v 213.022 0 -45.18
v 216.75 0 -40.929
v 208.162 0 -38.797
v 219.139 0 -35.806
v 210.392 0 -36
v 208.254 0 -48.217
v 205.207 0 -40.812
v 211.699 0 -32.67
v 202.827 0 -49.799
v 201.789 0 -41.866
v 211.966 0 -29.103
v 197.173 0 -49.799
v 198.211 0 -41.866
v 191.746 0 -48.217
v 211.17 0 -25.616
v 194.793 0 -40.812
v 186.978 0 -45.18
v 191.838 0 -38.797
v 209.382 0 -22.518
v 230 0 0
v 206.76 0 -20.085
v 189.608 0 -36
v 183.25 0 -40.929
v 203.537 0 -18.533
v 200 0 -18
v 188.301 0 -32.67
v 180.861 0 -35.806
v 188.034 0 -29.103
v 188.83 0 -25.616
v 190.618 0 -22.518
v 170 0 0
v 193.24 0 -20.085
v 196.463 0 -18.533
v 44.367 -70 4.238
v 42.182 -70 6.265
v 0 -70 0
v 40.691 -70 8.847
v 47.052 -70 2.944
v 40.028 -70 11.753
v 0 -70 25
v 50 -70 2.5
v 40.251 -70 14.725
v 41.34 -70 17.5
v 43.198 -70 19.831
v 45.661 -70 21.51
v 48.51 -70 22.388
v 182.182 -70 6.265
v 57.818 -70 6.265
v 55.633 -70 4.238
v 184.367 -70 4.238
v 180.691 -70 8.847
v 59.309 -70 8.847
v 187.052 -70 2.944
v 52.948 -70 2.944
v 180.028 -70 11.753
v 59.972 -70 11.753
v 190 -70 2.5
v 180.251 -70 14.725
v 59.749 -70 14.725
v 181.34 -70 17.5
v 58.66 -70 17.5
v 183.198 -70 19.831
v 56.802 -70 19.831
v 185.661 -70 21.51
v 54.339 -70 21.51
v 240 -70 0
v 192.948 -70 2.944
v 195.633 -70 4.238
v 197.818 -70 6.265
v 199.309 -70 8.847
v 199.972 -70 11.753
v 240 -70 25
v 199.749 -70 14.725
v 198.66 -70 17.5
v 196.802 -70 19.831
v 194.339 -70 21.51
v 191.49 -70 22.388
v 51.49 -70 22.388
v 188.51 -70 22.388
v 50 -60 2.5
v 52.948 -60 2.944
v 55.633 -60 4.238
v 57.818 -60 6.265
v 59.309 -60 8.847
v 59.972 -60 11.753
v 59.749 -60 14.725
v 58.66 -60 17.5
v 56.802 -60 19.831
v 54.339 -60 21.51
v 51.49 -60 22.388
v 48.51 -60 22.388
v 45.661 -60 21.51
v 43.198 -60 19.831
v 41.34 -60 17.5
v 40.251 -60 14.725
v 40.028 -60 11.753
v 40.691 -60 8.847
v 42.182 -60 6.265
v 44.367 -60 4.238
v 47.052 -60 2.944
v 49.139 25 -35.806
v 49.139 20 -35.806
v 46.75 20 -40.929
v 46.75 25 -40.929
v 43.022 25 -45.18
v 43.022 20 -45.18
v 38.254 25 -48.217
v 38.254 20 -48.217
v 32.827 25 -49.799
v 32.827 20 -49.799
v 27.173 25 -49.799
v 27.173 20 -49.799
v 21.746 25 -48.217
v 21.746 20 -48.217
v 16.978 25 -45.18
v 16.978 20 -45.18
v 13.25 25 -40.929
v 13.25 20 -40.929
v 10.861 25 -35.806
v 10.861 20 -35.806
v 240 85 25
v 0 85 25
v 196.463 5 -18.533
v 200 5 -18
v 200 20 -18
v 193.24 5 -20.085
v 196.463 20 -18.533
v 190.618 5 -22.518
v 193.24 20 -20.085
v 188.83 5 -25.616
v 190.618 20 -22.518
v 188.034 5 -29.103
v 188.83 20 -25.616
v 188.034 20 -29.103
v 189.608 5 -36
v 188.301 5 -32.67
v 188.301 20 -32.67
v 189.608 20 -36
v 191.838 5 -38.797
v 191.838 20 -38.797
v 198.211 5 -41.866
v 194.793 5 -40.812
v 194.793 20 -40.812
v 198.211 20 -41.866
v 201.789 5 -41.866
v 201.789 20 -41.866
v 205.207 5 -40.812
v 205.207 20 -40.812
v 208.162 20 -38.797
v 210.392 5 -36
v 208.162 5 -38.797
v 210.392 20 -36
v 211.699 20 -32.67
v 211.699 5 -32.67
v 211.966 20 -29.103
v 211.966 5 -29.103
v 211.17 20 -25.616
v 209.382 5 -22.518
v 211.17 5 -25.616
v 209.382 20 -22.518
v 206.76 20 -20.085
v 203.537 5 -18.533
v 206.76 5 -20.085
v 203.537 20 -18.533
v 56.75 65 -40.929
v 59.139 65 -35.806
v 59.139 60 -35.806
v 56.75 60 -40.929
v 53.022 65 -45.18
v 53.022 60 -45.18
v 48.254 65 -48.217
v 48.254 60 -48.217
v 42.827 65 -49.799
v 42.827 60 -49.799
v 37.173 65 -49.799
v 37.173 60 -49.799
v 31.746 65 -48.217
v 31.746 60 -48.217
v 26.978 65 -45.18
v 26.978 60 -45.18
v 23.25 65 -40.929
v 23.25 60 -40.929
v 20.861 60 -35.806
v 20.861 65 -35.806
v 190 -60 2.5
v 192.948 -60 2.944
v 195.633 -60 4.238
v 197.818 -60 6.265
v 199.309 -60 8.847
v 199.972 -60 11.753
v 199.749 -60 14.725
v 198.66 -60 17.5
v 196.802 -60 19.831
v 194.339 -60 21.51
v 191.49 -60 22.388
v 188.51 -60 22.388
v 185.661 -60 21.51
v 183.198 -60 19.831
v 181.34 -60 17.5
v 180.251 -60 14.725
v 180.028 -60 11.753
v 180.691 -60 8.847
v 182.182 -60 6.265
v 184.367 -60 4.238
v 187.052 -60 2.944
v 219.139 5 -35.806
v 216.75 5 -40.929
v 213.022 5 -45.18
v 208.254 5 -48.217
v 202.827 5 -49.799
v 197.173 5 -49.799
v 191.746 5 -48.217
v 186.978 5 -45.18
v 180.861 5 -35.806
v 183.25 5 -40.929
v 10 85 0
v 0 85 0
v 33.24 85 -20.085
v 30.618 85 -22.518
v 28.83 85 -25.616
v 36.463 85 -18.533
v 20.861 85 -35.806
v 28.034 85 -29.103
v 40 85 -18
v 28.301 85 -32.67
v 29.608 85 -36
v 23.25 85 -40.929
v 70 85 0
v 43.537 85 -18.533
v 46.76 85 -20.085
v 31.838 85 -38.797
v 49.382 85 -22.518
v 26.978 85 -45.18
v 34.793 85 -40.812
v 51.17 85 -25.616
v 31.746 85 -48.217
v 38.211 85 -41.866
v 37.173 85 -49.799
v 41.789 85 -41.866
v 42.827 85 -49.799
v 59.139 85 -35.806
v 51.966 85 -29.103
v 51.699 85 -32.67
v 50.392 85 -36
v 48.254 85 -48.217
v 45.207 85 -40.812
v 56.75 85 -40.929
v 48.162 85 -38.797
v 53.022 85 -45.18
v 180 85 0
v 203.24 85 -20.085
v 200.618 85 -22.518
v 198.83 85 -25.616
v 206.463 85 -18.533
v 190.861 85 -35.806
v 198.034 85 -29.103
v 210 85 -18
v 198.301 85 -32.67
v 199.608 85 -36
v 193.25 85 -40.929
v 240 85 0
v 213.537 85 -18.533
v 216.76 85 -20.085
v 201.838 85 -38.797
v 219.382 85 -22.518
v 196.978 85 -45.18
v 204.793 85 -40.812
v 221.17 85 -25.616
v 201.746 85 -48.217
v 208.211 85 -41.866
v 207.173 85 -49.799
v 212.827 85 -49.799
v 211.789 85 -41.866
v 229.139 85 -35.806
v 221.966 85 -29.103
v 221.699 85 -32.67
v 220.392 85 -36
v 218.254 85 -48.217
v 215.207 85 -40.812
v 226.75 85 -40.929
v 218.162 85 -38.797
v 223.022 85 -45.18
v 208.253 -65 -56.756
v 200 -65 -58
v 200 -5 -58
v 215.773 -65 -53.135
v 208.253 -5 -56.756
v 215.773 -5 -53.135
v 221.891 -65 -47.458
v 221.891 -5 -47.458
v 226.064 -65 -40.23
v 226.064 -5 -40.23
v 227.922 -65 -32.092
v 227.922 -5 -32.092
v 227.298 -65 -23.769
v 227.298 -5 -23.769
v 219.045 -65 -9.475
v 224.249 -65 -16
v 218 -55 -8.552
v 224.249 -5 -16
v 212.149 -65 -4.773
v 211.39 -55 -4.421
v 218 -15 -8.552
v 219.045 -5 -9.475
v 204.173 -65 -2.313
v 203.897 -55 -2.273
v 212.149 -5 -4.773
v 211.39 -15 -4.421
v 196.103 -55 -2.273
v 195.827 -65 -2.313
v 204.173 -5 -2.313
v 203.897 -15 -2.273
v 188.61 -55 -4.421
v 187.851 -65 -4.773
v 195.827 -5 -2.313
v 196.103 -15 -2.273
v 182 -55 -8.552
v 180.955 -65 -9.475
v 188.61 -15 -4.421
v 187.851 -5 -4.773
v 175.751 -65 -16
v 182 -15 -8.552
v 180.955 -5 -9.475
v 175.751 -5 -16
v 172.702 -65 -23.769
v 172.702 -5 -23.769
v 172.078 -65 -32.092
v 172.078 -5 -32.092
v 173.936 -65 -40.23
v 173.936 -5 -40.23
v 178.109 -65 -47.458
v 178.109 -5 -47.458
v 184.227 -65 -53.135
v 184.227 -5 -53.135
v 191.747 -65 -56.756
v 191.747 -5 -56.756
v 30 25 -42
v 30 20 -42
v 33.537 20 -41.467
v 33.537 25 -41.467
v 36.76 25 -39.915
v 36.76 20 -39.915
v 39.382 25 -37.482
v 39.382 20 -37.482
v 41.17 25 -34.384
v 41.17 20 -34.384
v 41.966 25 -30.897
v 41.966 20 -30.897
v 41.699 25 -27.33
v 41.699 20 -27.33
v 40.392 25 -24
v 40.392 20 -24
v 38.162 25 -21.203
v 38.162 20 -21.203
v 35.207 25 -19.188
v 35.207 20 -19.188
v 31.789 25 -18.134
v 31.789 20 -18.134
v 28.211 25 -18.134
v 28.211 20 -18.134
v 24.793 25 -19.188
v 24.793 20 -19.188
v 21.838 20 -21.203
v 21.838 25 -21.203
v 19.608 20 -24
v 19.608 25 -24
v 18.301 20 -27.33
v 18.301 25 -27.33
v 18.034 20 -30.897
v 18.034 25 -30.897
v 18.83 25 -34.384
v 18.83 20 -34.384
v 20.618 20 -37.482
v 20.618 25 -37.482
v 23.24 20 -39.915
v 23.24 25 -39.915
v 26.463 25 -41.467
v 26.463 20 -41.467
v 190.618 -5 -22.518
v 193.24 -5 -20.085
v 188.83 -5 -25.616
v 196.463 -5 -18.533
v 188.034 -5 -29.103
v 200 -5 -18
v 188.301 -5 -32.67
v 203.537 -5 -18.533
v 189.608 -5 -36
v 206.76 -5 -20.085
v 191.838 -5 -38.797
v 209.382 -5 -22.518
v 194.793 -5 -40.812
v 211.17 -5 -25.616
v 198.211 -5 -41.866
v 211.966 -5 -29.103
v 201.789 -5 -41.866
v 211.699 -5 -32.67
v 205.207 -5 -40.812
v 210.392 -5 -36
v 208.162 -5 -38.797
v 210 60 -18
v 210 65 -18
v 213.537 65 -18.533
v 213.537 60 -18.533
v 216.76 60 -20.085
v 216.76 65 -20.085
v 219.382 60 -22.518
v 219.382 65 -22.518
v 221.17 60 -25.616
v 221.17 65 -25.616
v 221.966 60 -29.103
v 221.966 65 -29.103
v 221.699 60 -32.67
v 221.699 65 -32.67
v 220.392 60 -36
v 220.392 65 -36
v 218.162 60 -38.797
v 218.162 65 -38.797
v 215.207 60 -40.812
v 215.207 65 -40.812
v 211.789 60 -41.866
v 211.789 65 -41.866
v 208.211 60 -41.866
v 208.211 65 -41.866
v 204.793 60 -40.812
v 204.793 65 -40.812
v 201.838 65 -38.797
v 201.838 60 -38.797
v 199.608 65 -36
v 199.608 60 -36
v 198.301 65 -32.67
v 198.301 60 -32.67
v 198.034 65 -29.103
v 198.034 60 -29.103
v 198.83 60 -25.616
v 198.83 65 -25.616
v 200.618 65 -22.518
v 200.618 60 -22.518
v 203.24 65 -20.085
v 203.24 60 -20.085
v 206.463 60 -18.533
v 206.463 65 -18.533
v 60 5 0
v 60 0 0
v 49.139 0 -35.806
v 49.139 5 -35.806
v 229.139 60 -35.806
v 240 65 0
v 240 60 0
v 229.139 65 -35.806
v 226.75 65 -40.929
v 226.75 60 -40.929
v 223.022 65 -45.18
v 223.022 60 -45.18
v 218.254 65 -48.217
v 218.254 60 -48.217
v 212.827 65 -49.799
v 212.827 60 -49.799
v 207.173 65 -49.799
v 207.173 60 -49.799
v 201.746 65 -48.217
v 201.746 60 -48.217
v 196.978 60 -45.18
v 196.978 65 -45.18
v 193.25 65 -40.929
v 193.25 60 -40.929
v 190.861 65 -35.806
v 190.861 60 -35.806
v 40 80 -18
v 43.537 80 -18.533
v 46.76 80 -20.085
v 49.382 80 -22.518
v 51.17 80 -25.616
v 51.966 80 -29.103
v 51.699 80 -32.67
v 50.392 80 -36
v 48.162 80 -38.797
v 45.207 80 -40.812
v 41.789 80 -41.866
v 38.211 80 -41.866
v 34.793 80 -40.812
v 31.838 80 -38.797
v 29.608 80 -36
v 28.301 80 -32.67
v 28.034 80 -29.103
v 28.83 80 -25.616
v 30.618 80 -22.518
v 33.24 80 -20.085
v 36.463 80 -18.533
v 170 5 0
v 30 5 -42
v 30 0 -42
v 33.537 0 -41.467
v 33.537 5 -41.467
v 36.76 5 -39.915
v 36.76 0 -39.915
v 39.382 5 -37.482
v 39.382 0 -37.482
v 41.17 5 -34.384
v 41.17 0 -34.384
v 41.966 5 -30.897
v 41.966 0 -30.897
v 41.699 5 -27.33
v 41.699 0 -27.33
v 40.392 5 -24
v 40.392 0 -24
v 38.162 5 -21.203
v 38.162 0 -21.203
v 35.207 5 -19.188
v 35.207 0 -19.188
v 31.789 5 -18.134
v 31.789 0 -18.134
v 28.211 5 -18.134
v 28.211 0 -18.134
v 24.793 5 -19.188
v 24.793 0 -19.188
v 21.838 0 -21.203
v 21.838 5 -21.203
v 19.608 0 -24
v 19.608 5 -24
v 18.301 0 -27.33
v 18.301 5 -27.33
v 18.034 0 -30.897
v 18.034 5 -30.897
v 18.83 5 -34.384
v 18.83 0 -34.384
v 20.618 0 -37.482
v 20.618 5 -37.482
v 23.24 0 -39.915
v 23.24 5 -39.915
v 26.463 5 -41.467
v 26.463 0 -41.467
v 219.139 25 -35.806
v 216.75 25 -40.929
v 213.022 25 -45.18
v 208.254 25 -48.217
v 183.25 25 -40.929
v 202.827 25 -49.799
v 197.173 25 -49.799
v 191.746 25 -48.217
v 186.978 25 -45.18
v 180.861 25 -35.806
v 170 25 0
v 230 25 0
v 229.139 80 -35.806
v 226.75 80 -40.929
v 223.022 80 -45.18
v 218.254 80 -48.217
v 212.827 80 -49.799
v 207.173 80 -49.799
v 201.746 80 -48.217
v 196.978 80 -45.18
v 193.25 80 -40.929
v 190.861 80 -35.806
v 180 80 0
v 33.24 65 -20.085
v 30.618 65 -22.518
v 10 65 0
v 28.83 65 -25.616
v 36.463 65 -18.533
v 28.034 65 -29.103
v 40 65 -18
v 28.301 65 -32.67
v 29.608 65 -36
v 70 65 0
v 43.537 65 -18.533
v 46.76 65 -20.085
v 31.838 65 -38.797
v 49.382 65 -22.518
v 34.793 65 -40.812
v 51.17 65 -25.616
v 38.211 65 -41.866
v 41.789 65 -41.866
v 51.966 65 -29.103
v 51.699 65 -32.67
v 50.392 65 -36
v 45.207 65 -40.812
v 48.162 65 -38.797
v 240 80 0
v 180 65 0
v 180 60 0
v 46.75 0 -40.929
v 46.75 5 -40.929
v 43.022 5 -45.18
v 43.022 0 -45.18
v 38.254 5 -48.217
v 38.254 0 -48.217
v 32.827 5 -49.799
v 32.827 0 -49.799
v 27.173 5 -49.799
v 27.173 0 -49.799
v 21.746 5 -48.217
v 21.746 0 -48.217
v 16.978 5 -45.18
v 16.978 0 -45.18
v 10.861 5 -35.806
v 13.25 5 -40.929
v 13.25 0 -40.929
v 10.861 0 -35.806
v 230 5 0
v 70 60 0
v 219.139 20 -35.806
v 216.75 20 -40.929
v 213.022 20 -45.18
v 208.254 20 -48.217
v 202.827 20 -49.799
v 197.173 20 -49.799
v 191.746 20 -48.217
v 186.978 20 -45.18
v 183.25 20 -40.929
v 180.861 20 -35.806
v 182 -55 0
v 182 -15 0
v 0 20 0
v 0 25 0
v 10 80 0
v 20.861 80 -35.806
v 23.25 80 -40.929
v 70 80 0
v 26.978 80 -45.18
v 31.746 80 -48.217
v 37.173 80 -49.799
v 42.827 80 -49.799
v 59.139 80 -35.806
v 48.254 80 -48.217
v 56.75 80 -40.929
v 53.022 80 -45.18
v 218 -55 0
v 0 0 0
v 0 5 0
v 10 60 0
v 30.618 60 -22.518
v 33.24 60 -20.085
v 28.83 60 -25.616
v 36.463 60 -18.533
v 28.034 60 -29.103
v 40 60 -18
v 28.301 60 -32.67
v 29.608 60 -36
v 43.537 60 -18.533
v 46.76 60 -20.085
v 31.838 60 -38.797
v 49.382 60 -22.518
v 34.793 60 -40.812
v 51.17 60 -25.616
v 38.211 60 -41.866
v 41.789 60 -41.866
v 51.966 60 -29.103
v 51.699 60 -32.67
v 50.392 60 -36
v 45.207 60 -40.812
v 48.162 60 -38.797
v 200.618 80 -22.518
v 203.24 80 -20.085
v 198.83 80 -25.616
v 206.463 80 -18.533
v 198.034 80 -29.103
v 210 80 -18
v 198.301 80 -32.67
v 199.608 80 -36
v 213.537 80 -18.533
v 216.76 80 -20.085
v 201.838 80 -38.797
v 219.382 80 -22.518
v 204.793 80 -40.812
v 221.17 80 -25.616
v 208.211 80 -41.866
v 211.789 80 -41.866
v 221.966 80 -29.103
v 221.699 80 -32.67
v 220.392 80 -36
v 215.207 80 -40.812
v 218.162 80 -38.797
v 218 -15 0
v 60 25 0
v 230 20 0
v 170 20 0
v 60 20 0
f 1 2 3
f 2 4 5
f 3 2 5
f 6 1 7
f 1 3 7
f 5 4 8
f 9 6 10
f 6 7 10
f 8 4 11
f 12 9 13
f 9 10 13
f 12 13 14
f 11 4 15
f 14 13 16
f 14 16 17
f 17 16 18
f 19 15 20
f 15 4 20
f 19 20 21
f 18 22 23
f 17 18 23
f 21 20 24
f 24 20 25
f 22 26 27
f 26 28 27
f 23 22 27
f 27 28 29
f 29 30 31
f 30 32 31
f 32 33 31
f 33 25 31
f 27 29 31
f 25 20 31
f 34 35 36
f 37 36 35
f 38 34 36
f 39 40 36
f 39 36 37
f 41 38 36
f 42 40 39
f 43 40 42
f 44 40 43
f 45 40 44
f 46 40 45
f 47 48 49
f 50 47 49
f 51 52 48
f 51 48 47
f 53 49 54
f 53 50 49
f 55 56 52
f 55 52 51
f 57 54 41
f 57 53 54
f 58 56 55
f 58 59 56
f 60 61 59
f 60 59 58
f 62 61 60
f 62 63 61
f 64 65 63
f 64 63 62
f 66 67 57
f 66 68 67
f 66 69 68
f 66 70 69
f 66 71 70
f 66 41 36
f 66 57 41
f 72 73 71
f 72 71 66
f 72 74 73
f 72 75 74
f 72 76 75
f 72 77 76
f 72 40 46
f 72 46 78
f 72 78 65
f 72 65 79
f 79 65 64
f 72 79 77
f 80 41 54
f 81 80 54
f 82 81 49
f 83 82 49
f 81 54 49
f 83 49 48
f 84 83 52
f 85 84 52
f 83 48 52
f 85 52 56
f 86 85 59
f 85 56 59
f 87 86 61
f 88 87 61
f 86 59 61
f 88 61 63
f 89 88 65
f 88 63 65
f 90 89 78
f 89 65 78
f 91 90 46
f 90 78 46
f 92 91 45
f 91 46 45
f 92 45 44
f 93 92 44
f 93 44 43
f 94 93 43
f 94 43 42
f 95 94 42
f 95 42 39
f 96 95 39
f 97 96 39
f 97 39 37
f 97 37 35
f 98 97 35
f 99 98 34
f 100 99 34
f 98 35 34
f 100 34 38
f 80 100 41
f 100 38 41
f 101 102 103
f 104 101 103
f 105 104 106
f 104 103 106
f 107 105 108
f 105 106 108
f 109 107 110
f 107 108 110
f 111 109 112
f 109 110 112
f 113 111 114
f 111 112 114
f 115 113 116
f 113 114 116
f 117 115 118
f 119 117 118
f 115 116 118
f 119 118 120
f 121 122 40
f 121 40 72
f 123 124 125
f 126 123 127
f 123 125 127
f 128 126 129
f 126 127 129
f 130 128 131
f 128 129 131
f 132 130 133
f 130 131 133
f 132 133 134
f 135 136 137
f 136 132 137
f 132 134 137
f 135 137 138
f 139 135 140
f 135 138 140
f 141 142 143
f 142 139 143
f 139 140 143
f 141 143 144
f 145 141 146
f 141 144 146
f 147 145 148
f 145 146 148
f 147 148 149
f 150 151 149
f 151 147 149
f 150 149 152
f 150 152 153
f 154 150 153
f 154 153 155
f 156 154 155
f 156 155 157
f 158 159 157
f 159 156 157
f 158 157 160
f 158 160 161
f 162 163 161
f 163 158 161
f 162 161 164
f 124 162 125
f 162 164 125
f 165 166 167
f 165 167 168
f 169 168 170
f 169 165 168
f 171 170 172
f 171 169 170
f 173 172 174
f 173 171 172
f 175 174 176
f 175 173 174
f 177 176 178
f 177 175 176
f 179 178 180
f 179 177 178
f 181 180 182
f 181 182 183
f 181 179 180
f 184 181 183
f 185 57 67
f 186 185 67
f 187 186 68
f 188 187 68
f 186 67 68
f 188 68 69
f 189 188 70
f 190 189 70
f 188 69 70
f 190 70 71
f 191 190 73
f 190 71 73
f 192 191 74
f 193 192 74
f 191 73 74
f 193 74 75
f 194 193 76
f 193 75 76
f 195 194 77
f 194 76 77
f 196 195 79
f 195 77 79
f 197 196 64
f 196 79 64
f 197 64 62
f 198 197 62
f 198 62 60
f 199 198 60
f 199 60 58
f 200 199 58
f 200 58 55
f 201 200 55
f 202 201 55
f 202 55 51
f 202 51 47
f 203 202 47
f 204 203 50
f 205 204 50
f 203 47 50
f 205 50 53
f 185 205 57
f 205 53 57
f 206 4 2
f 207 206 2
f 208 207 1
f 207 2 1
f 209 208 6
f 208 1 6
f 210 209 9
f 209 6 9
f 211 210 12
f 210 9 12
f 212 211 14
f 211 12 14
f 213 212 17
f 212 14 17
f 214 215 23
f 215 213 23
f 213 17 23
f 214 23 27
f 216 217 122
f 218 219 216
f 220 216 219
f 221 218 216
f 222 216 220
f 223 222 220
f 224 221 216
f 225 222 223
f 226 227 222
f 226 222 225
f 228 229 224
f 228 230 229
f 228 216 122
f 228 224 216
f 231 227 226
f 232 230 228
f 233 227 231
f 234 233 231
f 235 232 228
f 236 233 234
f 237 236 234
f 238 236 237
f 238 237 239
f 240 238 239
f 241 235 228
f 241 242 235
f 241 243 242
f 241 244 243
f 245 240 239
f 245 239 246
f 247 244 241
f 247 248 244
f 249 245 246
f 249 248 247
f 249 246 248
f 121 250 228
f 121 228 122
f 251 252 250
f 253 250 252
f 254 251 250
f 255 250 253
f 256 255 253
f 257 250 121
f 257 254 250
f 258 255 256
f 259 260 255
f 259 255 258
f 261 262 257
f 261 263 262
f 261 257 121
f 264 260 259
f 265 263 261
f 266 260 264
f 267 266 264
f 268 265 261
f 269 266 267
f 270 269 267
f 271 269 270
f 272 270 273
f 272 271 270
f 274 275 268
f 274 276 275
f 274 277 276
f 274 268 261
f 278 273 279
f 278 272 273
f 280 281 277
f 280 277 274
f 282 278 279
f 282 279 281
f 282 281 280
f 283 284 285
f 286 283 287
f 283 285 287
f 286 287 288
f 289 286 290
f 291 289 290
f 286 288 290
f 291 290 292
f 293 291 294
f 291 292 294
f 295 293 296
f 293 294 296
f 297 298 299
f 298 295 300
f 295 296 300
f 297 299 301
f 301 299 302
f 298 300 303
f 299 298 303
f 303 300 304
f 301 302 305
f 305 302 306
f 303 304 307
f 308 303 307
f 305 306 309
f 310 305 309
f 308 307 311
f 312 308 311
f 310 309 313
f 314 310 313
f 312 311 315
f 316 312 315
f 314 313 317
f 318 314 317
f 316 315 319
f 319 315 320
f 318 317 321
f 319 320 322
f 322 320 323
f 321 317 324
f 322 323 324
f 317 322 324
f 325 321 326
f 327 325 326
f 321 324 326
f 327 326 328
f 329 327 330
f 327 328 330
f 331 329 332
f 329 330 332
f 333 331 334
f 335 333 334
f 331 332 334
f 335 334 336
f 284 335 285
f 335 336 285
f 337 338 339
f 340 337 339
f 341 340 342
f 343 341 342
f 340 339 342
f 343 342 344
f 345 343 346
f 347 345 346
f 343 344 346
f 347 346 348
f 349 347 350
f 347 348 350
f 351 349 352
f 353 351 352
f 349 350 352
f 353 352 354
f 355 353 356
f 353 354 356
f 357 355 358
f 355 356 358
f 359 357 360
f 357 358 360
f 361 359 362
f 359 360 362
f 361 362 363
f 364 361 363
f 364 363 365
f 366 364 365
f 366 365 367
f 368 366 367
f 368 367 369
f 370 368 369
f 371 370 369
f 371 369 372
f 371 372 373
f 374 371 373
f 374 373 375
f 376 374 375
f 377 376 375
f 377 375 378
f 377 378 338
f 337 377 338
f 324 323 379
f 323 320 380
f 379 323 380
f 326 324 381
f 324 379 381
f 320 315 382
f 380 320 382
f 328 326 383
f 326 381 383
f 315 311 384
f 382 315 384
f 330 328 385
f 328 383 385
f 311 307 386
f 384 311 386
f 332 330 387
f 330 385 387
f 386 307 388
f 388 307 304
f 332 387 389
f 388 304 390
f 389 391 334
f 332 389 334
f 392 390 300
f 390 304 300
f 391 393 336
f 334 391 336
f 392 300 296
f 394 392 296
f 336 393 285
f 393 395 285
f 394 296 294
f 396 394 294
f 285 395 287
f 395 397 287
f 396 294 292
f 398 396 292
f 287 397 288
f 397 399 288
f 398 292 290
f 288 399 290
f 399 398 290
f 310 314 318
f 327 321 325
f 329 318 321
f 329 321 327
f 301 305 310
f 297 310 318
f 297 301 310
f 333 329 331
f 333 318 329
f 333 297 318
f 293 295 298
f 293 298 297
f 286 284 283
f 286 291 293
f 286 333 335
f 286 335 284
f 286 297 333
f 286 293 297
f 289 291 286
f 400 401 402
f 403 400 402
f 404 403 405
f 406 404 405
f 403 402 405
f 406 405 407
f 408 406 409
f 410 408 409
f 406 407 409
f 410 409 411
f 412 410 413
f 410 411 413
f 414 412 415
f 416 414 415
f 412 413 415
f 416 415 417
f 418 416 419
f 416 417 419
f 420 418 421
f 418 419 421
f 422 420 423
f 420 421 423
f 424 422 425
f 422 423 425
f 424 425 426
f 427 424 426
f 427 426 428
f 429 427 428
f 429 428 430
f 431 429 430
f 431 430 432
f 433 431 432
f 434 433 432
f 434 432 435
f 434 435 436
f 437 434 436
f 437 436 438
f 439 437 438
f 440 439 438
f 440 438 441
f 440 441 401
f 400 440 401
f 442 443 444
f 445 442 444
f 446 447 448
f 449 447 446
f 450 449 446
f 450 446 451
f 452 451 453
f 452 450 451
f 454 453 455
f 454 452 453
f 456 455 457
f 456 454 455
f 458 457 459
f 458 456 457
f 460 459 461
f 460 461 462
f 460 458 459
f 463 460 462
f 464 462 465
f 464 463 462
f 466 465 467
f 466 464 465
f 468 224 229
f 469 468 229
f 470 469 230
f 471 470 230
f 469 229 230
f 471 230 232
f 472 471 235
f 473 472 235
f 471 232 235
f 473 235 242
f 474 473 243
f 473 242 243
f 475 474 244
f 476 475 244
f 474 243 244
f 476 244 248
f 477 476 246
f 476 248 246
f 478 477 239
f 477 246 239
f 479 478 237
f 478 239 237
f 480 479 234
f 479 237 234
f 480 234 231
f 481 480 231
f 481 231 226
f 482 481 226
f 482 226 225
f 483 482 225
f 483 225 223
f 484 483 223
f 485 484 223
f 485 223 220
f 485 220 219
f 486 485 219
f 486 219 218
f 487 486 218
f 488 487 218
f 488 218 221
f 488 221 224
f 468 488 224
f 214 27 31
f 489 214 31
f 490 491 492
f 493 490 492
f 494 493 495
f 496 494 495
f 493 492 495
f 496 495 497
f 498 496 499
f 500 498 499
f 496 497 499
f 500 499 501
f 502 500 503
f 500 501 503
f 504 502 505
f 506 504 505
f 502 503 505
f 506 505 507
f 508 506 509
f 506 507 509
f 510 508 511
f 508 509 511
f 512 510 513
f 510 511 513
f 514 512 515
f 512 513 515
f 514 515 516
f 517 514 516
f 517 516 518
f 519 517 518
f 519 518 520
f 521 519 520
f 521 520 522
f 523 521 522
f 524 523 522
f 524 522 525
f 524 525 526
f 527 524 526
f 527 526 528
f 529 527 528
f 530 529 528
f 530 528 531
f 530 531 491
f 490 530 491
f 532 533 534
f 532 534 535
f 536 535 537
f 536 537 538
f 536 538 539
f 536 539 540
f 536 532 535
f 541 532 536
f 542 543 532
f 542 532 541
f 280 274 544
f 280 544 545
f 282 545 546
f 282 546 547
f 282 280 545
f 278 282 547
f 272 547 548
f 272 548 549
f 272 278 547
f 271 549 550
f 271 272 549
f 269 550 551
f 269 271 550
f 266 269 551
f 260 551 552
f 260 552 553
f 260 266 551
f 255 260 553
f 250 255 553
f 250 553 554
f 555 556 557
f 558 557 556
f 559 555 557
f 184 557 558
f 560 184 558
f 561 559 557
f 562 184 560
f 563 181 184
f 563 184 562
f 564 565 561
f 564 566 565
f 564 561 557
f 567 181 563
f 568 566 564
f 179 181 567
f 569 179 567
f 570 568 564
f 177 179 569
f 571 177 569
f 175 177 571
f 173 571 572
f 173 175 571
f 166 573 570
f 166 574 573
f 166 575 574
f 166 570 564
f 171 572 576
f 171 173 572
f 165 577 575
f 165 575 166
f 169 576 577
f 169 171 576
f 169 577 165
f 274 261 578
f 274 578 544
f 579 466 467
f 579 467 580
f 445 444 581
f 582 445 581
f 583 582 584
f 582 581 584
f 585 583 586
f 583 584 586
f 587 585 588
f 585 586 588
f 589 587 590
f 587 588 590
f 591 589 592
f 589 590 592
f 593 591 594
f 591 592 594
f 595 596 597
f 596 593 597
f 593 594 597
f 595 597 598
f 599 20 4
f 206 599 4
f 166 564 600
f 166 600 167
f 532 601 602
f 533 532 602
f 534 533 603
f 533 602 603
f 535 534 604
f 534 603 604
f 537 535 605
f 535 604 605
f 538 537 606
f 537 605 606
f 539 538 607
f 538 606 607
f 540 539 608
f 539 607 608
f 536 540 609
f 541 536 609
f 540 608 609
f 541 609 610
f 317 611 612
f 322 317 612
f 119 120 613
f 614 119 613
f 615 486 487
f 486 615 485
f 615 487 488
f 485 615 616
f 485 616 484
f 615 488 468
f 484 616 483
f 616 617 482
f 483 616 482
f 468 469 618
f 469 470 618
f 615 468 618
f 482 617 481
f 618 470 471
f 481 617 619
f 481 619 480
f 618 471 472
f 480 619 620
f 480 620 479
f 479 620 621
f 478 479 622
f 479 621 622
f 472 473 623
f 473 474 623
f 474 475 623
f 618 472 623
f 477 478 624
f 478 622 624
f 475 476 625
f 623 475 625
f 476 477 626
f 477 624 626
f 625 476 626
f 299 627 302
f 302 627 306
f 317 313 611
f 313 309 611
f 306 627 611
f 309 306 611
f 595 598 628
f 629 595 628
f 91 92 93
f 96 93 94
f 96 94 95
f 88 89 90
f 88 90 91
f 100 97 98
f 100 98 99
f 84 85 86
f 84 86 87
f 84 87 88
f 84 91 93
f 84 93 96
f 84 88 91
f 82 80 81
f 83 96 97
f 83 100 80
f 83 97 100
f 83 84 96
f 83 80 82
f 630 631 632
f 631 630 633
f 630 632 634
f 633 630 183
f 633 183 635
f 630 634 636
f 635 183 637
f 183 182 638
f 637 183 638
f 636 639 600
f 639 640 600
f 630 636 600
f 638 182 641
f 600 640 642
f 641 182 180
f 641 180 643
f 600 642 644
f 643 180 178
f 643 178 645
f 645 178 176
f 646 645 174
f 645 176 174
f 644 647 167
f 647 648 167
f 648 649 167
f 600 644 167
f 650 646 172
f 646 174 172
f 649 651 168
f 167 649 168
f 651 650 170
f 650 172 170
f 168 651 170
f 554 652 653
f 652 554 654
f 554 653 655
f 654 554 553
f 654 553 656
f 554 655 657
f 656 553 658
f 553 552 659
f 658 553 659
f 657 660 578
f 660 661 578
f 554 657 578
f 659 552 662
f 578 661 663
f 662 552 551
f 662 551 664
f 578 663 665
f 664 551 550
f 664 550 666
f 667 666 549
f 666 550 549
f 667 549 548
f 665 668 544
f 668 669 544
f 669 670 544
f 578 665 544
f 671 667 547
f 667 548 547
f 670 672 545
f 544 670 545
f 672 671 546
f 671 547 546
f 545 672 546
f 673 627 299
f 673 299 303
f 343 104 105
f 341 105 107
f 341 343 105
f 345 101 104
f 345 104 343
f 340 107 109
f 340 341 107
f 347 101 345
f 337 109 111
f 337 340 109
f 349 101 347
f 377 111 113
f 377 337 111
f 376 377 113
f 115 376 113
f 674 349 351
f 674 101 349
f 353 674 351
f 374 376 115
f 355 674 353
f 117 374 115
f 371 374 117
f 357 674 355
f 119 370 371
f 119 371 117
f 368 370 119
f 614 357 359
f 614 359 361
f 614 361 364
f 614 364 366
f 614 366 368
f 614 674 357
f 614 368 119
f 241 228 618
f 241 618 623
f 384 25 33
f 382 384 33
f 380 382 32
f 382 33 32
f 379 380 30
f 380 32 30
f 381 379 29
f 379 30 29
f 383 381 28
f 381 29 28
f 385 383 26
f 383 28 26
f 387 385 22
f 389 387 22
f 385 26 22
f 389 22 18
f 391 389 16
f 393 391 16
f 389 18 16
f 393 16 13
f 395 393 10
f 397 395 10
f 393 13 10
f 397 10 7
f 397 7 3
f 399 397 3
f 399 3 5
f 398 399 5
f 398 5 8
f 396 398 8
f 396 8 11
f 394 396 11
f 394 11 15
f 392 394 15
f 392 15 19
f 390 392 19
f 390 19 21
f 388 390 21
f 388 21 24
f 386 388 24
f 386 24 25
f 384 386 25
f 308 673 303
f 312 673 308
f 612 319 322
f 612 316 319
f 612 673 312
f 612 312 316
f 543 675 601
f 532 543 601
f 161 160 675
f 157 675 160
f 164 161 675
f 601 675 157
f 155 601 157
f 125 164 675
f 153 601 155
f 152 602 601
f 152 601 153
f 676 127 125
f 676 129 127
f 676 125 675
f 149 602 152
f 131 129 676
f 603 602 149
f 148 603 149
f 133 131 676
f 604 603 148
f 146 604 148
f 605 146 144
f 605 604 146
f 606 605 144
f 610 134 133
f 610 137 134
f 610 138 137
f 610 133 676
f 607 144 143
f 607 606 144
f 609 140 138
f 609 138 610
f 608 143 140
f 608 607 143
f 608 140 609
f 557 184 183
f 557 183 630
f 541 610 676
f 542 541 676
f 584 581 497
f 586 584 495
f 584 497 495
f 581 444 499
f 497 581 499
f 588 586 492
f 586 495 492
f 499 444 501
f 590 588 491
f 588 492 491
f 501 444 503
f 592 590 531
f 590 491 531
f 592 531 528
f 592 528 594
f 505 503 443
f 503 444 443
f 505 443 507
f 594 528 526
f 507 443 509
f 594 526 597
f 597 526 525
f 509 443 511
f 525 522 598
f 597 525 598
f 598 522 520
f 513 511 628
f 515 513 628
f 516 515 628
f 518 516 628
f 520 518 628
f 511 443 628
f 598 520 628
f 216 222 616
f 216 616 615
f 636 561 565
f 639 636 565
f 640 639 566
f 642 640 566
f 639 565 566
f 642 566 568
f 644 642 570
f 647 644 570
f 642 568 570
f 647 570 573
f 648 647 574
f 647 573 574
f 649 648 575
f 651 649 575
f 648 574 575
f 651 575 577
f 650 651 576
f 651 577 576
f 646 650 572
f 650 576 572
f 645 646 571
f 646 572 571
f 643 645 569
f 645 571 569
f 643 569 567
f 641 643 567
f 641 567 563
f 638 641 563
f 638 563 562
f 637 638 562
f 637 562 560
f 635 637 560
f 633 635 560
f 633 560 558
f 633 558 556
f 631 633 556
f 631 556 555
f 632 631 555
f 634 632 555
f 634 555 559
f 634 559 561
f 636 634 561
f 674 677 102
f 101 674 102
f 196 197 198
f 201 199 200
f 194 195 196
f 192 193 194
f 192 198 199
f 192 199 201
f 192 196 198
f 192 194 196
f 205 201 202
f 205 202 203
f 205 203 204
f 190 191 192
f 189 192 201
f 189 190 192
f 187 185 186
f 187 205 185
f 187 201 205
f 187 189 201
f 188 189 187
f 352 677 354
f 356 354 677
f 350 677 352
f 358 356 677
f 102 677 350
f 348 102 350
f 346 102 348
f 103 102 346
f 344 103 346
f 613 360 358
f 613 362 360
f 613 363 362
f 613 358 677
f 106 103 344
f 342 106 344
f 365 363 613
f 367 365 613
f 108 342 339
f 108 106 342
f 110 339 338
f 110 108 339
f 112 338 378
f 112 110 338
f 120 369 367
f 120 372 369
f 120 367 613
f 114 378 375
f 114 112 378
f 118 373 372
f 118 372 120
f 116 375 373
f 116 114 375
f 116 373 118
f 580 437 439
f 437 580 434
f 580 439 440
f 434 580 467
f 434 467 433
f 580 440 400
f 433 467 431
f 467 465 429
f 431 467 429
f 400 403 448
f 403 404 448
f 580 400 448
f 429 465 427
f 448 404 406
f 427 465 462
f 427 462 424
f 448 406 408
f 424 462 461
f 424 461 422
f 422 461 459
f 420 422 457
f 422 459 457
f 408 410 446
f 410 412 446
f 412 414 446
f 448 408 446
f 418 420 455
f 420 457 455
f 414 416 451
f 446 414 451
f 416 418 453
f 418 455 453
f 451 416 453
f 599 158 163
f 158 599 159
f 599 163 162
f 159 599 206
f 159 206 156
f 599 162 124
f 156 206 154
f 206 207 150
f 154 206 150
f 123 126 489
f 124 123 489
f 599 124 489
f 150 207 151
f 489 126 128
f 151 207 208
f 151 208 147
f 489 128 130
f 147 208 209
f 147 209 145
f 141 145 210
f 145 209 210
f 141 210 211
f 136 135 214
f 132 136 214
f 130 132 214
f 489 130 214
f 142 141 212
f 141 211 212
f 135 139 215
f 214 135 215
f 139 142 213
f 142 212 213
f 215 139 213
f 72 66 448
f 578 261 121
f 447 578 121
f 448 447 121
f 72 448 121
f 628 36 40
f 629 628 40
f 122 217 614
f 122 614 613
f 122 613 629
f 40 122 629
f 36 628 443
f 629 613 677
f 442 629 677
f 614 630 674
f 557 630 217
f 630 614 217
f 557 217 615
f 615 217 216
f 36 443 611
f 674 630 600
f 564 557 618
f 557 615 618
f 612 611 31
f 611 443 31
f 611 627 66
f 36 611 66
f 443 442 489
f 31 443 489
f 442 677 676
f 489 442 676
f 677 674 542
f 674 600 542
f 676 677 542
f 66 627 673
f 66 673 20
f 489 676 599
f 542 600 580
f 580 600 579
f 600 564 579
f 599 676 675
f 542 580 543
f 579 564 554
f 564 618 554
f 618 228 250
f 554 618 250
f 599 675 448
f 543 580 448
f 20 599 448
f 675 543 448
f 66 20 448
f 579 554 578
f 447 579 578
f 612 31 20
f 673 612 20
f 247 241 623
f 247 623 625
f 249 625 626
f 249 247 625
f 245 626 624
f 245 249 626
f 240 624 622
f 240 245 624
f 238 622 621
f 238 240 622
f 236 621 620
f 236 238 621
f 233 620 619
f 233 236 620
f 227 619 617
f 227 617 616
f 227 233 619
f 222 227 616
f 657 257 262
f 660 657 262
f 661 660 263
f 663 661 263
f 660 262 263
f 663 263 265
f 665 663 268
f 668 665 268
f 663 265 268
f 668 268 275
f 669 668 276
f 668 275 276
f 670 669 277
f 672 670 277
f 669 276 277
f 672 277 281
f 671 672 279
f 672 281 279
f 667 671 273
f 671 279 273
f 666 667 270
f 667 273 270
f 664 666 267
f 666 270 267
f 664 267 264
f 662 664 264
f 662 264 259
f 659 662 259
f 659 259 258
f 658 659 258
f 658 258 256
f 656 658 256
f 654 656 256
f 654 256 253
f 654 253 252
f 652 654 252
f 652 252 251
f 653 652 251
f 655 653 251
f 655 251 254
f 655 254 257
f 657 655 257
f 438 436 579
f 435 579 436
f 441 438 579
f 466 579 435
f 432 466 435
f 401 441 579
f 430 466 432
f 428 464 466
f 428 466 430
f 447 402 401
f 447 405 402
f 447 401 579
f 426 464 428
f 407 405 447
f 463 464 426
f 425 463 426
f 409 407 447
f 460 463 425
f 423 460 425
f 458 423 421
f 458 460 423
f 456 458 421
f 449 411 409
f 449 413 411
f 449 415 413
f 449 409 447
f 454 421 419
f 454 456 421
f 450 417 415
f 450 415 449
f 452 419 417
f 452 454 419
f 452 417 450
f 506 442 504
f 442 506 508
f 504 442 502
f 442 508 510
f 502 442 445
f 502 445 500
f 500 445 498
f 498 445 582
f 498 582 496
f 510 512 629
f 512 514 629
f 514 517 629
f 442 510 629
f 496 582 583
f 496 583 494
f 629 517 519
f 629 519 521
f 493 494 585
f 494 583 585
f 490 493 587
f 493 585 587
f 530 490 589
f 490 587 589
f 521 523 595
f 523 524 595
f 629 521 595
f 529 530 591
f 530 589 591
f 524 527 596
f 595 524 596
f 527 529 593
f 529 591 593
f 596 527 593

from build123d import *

# Parameters (mm, degrees)
SKETCH_1_W           = 240
SKETCH_1_H           = 85
EXTRUDE_1_DEPTH      = 25
SKETCH_2_R           = 12
EXTRUDE_2_DEPTH      = 25
SKETCH_3_W           = 233.337502947
SKETCH_3_H           = 53.700186647
CUT_EXTRUDE_1_DEPTH  = 15
SKETCH_4_R           = 12
EXTRUDE_3_DEPTH      = 25
SKETCH_5_W           = 240.131792842
SKETCH_5_H           = 54.002866145
CUT_EXTRUDE_2_DEPTH  = 15
EXTRUDE_4_DEPTH      = 5
EXTRUDE_4_DEPTH_BACK = 25
SKETCH_6_R           = 12
SKETCH_8_R           = 28
EXTRUDE_5_DEPTH      = 60
SKETCH_9_W           = 240
SKETCH_9_H           = 25
EXTRUDE_6_DEPTH      = 70
SKETCH_10_W          = 36
SKETCH_10_H          = 40
EXTRUDE_7_DEPTH      = 15
SKETCH_11_R          = 10
CUT_EXTRUDE_3_DEPTH  = 10


with BuildPart() as part:
    # 草图1 → 凸台-拉伸1 (new body)
    with BuildSketch(Plane.XY):
        with Locations((120, 42.5)):
            Rectangle(SKETCH_1_W, SKETCH_1_H)
    extrude(amount=EXTRUDE_1_DEPTH)

    # 草图2 → 凸台-拉伸2 (add)
    # profile 1 of 2: a face of its own
    with BuildSketch(Plane.XZ):
        with BuildLine():
            Line((0, 0), (30, 0))
            Line((30, 0), (60, 0))
            Line((60, 0), (49.138858248, -35.805524564))
            ThreePointArc((49.138858248, -35.805524564), (30, -50.000000263), (10.861141752, -35.805524564))
            Line((10.861141752, -35.805524564), (0, 0))
        make_face()
        with Locations(Location((30, -30, 0), (0, 0, 270))):
            Circle(SKETCH_2_R, mode=Mode.SUBTRACT)
    # profile 2 of 2: a face of its own
    with BuildSketch(Plane.XZ):
        with BuildLine():
            Line((170, 0), (230, 0))
            Line((230, 0), (219.138858248, -35.805524564))
            ThreePointArc((219.138858248, -35.805524564), (200, -50.000000263), (180.861141752, -35.805524564))
            Line((180.861141752, -35.805524564), (170, 0))
        make_face()
        with Locations(Location((200, -30, 0), (0, 0, 270))):
            Circle(SKETCH_2_R, mode=Mode.SUBTRACT)
    extrude(amount=-EXTRUDE_2_DEPTH)

    # 草图3 → 切除-拉伸1 (cut)
    with BuildSketch(Plane(origin=(0, 5, 0), x_dir=(-1, 0, 0), z_dir=(0, -1, 0))):
        with Locations((-113.331248527, 26.850093324)):
            Rectangle(SKETCH_3_W, SKETCH_3_H)
    extrude(amount=-CUT_EXTRUDE_1_DEPTH, mode=Mode.SUBTRACT)

    # 草图4 → 凸台-拉伸3 (add)
    # profile 1 of 2: a face of its own
    with BuildSketch(Plane(origin=(0, 85, 0), x_dir=(1, 0, 0), z_dir=(0, 1, 0))):
        with BuildLine():
            Line((20.861141752, 35.805524564), (10, 0))
            Line((10, 0), (70, 0))
            Line((70, 0), (59.138858248, 35.805524564))
            ThreePointArc((59.138858248, 35.805524564), (40, 50.000000263), (20.861141752, 35.805524564))
        make_face()
        with Locations(Location((40, 30, 0), (0, 0, 270))):
            Circle(SKETCH_4_R, mode=Mode.SUBTRACT)
    # profile 2 of 2: a face of its own
    with BuildSketch(Plane(origin=(0, 85, 0), x_dir=(1, 0, 0), z_dir=(0, 1, 0))):
        with BuildLine():
            Line((190.861141752, 35.805524564), (180, 0))
            Line((180, 0), (240, 0))
            Line((240, 0), (229.138858248, 35.805524564))
            ThreePointArc((229.138858248, 35.805524564), (210, 50.000000263), (190.861141752, 35.805524564))
        make_face()
        with Locations(Location((210, 30, 0), (0, 0, 270))):
            Circle(SKETCH_4_R, mode=Mode.SUBTRACT)
    extrude(amount=-EXTRUDE_3_DEPTH)

    # 草图5 → 切除-拉伸2 (cut)
    with BuildSketch(Plane(origin=(0, 80, 0), x_dir=(1, 0, 0), z_dir=(0, 1, 0))):
        with Locations((130.065896421, 27.001433073)):
            Rectangle(SKETCH_5_W, SKETCH_5_H)
    extrude(amount=-CUT_EXTRUDE_2_DEPTH, mode=Mode.SUBTRACT)

    # 草图6 → 凸台-拉伸4 (add, two sides: drawn at the far end of the back side and taken through both)
    with BuildSketch(Plane.XZ.offset(-EXTRUDE_4_DEPTH_BACK)):
        with Locations(Location((200, -30, 0), (0, 0, 90))):
            Circle(SKETCH_6_R)
    extrude(amount=EXTRUDE_4_DEPTH + EXTRUDE_4_DEPTH_BACK)

    # 草图8 → 凸台-拉伸5 (add)
    with BuildSketch(Plane.XZ.offset(5)):
        with Locations(Location((200, -30, 0), (0, 0, 270))):
            Circle(SKETCH_8_R)
    extrude(amount=EXTRUDE_5_DEPTH)

    # 草图9 → 凸台-拉伸6 (add)
    with BuildSketch(Plane.XZ):
        with Locations((120, 12.5)):
            Rectangle(SKETCH_9_W, SKETCH_9_H)
    extrude(amount=EXTRUDE_6_DEPTH)

    # 草图10 → 凸台-拉伸7 (add)
    with BuildSketch(Plane(origin=(0, 0, 0), x_dir=(-1, 0, 0), z_dir=(0, 0, -1))):
        with Locations((-200, -35)):
            Rectangle(SKETCH_10_W, SKETCH_10_H)
    extrude(amount=EXTRUDE_7_DEPTH)

    # 草图11 → 切除-拉伸3 (cut)
    with BuildSketch(Plane.XZ.offset(70)):
        with Locations(Location((50, 12.5, 0), (0, 0, 270))):
            Circle(SKETCH_11_R)
        with Locations(Location((190, 12.5, 0), (0, 0, 270))):
            Circle(SKETCH_11_R)
    extrude(amount=-CUT_EXTRUDE_3_DEPTH, mode=Mode.SUBTRACT)


solid = part.part
